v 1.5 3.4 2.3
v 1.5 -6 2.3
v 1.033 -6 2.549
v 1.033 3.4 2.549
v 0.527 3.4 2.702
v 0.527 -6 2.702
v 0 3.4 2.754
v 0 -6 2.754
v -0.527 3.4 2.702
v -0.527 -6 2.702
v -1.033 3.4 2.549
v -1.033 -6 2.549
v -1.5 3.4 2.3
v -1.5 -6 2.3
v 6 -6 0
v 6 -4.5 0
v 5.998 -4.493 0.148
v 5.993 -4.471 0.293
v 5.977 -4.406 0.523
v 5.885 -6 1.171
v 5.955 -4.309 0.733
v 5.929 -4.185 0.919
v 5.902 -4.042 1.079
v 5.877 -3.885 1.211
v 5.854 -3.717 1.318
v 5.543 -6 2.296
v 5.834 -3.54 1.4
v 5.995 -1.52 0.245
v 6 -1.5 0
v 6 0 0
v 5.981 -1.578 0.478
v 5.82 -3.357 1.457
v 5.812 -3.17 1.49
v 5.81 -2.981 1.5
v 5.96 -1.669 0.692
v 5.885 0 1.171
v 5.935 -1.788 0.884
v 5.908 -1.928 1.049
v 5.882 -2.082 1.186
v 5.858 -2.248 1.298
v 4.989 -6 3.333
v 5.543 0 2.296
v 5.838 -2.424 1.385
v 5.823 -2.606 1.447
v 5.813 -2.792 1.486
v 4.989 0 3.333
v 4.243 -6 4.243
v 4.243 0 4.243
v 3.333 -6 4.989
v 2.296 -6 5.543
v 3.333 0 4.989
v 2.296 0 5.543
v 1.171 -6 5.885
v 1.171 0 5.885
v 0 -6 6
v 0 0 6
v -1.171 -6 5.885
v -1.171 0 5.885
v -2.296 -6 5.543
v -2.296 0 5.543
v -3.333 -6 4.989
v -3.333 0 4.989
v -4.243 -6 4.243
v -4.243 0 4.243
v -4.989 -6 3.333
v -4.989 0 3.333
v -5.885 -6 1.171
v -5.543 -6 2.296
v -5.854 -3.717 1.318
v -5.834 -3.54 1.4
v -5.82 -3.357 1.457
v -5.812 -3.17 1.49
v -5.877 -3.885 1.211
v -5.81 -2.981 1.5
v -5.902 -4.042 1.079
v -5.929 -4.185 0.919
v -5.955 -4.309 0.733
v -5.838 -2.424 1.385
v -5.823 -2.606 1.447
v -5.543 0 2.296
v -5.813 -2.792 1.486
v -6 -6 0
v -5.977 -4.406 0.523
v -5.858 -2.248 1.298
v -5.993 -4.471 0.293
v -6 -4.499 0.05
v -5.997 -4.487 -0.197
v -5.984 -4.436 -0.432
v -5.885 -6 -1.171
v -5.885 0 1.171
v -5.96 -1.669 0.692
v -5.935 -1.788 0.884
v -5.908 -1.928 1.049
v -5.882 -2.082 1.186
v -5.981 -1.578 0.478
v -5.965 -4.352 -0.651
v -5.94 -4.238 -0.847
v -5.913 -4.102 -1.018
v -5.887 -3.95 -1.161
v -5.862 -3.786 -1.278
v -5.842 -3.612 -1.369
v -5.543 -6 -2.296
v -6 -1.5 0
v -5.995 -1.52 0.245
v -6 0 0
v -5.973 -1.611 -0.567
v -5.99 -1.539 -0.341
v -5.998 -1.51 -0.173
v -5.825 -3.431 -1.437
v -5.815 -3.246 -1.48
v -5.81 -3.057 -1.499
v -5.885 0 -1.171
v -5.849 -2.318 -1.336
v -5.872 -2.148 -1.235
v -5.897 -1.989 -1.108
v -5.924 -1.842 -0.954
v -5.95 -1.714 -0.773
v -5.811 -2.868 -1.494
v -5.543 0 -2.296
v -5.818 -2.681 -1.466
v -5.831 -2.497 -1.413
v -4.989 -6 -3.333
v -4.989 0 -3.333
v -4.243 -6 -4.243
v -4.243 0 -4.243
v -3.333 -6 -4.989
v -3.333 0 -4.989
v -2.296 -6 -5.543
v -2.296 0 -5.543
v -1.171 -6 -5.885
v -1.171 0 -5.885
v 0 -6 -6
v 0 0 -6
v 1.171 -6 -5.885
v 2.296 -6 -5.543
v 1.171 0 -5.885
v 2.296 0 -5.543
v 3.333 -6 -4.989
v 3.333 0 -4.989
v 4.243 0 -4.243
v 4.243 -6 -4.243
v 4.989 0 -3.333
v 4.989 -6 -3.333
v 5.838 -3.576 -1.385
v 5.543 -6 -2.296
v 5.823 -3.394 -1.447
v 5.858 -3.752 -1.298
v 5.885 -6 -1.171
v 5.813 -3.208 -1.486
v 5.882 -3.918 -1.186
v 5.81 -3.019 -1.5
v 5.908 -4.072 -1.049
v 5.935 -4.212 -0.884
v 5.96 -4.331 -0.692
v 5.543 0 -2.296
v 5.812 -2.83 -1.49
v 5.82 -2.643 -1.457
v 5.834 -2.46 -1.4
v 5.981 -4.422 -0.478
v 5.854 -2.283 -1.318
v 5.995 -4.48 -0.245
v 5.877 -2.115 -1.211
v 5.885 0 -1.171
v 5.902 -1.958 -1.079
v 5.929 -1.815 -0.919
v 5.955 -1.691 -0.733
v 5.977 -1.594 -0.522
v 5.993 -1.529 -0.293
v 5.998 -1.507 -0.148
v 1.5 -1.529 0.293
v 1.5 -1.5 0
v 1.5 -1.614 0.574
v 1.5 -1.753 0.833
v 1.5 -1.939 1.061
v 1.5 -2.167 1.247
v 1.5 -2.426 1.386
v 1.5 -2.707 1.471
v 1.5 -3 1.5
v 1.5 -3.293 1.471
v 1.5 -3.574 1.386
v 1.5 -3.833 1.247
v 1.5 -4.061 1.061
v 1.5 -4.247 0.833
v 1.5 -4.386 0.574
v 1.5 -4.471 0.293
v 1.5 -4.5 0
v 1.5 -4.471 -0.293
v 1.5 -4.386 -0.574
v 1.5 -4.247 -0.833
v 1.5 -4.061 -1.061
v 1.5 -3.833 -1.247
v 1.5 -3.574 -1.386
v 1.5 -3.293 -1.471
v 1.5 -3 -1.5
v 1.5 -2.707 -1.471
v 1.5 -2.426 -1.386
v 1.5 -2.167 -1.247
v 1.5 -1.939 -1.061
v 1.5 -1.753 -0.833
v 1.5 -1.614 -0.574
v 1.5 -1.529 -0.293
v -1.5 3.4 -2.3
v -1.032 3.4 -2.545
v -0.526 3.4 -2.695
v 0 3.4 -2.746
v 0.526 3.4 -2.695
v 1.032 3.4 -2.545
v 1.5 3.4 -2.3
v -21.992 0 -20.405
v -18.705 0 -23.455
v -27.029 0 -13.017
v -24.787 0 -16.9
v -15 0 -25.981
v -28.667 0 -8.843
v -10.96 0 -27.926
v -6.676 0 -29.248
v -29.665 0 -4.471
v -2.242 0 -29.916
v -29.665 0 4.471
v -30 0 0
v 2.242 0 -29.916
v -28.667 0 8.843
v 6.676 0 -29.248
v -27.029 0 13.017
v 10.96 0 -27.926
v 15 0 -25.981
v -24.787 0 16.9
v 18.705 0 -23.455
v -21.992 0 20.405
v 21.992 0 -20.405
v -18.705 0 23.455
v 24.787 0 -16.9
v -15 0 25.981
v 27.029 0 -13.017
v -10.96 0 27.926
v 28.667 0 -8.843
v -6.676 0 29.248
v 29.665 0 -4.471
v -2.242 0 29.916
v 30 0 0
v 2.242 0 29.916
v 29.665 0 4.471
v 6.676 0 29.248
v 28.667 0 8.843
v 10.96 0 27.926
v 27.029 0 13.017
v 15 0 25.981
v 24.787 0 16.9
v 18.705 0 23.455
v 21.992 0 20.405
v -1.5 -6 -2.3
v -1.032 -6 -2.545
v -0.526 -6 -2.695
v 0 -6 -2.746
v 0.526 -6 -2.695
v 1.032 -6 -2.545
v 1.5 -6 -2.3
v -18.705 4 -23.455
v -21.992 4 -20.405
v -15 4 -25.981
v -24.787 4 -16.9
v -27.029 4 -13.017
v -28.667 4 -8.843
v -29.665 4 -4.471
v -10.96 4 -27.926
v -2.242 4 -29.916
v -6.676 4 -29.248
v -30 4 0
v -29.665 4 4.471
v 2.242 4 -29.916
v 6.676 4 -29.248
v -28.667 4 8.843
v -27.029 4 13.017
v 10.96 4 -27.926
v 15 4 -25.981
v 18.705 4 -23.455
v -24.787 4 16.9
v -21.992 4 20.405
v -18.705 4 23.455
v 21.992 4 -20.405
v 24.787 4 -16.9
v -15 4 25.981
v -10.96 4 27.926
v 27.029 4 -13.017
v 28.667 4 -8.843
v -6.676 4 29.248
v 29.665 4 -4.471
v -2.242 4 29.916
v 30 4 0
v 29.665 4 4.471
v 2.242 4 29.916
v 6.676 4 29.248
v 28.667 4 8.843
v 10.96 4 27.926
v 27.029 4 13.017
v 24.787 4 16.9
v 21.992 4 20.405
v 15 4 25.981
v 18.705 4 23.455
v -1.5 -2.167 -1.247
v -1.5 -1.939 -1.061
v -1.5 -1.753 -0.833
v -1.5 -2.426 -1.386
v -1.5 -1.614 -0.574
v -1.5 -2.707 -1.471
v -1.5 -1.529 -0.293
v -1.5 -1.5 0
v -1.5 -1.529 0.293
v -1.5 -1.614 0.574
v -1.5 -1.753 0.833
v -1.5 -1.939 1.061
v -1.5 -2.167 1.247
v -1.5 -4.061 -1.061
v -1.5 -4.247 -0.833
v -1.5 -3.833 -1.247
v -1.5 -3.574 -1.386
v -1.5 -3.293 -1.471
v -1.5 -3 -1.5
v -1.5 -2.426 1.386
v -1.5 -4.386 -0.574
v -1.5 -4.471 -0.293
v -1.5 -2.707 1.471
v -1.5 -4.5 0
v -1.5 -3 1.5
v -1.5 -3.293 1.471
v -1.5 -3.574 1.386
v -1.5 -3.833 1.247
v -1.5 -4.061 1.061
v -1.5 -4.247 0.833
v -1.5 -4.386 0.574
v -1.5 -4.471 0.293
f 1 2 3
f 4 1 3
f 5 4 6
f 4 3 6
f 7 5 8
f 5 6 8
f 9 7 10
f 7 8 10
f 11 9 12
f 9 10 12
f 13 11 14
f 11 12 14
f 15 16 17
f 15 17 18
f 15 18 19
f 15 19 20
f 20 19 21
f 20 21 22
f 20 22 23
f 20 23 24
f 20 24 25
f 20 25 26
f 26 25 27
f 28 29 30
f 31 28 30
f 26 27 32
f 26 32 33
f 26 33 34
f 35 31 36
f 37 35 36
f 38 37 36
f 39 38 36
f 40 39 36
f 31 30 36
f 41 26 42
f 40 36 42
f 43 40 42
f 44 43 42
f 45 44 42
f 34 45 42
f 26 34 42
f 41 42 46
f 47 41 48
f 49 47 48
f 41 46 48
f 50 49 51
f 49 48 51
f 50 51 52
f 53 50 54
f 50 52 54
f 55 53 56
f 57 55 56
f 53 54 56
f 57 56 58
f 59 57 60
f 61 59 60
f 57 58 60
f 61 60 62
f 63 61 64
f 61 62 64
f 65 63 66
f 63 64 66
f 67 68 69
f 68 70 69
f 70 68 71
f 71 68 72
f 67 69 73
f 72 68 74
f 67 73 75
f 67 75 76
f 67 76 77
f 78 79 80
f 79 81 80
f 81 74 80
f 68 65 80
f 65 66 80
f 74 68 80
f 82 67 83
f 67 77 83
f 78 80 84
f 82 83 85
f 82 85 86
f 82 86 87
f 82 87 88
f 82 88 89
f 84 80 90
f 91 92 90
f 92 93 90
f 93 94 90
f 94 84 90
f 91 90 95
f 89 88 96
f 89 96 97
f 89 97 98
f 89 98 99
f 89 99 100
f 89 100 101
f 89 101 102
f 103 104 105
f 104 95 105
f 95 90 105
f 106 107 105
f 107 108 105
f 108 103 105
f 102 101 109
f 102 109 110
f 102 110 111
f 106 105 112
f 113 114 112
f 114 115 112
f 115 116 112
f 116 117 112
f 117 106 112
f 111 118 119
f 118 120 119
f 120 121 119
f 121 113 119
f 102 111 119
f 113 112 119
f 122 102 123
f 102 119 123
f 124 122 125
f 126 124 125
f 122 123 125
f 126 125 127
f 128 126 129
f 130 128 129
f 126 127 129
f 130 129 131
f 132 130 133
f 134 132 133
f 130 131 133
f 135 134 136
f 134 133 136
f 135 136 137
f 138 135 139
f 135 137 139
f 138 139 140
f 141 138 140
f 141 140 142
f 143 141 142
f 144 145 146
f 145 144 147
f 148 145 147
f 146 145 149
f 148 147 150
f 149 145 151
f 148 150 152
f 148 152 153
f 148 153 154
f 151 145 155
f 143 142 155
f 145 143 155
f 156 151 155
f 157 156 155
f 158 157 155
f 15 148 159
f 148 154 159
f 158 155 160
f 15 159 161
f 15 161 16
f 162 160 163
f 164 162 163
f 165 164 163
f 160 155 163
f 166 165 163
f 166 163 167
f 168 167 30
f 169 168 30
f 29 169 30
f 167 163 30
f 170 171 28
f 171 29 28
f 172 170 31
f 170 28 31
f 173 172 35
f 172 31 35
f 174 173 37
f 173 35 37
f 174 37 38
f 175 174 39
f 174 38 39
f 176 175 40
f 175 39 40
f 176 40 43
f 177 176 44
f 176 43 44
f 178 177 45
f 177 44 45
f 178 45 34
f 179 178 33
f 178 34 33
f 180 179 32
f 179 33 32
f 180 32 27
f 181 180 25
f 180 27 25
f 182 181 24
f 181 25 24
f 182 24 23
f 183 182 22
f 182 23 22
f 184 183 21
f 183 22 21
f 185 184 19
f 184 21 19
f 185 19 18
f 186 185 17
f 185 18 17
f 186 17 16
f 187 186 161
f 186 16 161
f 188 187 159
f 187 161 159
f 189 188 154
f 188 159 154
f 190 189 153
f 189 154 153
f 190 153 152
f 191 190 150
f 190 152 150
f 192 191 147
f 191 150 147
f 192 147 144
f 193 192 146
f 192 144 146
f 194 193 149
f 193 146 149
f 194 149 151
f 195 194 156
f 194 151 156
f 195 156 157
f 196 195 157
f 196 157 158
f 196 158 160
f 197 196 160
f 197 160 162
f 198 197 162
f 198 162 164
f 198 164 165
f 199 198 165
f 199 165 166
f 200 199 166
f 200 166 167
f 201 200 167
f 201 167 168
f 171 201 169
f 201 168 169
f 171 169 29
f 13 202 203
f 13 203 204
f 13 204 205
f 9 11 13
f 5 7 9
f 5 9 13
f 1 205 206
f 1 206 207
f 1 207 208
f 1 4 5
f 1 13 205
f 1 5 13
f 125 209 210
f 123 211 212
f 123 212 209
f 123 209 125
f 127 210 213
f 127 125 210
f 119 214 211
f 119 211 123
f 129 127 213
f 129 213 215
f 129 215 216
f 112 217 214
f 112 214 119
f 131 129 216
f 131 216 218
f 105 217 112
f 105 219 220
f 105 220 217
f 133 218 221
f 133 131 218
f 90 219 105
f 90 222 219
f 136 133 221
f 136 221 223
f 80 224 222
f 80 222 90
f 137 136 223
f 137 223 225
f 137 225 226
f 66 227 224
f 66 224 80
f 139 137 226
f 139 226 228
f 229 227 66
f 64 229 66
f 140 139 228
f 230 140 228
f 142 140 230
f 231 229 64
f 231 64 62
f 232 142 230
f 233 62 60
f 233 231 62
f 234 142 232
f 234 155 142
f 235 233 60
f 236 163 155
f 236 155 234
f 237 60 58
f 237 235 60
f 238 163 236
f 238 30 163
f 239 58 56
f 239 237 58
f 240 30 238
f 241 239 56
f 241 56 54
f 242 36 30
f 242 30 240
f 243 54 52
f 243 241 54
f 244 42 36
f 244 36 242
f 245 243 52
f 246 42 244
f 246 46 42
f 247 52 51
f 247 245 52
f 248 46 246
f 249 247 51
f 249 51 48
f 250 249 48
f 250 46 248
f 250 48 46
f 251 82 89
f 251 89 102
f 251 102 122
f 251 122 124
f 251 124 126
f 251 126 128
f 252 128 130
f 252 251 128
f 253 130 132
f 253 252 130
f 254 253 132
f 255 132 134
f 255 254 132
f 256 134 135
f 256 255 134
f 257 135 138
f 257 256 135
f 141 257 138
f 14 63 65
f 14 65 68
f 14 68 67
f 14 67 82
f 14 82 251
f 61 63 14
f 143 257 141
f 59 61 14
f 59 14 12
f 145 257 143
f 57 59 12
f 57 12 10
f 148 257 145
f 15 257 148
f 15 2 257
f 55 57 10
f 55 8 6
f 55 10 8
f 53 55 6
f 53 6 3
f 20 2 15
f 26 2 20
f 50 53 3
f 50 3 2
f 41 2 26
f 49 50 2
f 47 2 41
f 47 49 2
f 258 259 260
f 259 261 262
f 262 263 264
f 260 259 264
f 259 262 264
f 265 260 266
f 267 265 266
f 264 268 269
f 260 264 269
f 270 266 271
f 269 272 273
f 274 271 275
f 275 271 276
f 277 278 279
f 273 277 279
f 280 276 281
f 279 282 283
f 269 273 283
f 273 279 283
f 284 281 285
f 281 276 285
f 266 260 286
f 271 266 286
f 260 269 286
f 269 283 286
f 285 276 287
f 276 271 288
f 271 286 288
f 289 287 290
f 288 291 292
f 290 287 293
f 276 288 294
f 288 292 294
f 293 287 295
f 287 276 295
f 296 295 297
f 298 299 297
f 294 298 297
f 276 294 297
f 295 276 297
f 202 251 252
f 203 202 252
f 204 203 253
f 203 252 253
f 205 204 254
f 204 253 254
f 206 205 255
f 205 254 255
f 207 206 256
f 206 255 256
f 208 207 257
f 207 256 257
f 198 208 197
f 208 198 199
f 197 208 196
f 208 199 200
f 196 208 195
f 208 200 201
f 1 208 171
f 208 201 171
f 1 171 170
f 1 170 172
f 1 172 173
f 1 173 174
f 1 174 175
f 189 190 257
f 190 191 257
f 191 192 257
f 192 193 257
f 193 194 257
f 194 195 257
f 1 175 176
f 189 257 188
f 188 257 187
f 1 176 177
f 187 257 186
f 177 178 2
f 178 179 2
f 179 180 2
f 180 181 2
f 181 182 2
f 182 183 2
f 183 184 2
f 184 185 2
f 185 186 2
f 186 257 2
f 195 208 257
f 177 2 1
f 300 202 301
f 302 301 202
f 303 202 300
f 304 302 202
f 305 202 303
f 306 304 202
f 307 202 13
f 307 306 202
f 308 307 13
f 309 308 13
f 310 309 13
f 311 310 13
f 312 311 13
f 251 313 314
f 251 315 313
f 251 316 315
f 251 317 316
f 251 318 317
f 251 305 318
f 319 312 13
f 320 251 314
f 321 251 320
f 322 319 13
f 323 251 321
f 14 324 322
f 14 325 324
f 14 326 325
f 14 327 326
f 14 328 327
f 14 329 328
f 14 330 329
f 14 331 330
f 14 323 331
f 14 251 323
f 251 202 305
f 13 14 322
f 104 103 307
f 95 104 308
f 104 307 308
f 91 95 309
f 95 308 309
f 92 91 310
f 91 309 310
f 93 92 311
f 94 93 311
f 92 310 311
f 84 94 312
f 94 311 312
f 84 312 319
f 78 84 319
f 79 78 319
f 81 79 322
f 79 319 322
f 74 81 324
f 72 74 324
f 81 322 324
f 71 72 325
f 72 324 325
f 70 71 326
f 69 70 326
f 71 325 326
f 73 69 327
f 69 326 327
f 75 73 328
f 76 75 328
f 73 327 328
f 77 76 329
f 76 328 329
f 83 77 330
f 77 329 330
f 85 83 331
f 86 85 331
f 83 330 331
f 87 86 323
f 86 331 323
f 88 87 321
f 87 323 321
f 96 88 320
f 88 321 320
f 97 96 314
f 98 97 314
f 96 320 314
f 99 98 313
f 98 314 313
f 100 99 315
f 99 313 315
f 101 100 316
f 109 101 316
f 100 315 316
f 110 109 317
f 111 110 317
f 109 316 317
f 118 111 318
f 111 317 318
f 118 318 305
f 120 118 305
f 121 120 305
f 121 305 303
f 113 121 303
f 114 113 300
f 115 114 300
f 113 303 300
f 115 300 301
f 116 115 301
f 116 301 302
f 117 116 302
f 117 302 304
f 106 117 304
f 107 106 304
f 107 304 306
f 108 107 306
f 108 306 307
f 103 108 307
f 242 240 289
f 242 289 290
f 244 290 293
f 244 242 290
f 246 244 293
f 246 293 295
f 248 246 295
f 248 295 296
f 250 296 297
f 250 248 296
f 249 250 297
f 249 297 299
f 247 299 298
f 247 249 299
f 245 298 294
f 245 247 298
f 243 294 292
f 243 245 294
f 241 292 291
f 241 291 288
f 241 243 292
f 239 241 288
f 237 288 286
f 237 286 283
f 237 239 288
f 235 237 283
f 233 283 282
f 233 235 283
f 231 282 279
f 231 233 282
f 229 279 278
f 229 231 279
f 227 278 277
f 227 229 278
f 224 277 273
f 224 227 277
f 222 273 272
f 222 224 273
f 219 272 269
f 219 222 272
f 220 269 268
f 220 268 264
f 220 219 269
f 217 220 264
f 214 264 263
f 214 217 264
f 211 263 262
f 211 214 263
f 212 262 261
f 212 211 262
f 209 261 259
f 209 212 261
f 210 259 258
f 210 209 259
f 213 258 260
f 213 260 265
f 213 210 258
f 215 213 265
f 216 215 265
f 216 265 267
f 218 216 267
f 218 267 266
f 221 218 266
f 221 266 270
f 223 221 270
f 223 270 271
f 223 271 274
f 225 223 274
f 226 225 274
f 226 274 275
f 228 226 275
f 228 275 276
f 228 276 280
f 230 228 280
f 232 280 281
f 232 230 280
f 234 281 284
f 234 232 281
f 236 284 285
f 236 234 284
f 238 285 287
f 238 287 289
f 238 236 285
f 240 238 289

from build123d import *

# Parameters (mm, degrees)
F0_R     = 30
F0_R_2   = 6
F1_DEPTH = 4
F2_DEPTH = 6
F3_R     = 1.5
F4_DEPTH = 12.5
F5_W     = 3
F5_H     = 4.6
F6_DEPTH = 9.4


with BuildPart() as f1:
    # F0 (on Front) → F1 (new body)
    with BuildSketch(Plane.XZ):
        Circle(F0_R)
        Circle(F0_R_2, mode=Mode.SUBTRACT)
        Circle(F0_R_2)
    extrude(amount=-F1_DEPTH)

    # F0 (on Front) → F2 (join)
    with BuildSketch(Plane.XZ):
        Circle(F0_R_2)
    extrude(amount=F2_DEPTH)

    # F3 (on Right) → F4 (cut, symmetric)
    with BuildSketch(Plane.YZ):
        with Locations((-3, 0)):
            Circle(F3_R)
    extrude(amount=F4_DEPTH, both=True, mode=Mode.SUBTRACT)

    # F5 (on face) → F6 (cut)
    with BuildSketch(Plane.XZ.offset(6)):
        Rectangle(F5_W, F5_H)
        with BuildLine():
            Line((-1.5, 2.3), (1.5, 2.3))
            ThreePointArc((1.5, 2.3), (0, 2.7540939565), (-1.5, 2.3))
        make_face()
        with BuildLine():
            ThreePointArc((-1.5, -2.3), (0, -2.7459060435), (1.5, -2.3))
            Line((1.5, -2.3), (-1.5, -2.3))
        make_face()
    extrude(amount=-F6_DEPTH, mode=Mode.SUBTRACT)


solid = f1.part
